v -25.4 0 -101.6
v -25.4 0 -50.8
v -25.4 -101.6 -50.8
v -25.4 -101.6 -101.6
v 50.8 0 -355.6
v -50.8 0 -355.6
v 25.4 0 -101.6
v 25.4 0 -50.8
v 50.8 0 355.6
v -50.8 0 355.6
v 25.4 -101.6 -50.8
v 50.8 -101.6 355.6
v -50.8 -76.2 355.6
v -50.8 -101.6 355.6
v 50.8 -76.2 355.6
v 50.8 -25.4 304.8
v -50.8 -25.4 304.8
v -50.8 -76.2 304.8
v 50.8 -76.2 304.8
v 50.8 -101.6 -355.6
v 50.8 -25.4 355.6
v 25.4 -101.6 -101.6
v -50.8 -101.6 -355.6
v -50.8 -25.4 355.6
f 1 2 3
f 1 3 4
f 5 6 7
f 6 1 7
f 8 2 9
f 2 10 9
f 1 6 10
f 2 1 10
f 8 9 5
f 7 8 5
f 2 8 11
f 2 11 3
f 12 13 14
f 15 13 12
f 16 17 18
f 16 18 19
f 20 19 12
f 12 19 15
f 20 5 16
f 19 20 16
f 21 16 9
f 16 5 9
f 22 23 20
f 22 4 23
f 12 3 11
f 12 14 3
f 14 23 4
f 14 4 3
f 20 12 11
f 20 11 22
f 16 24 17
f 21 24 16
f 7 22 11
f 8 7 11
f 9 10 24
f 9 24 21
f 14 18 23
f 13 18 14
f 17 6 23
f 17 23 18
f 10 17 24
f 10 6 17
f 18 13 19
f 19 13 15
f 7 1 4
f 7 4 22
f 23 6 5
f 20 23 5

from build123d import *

# Parameters (mm, degrees)
F0_W     = 101.6
F0_H     = 711.2
F1_DEPTH = 101.6
F2_W     = 101.6
F2_H     = 50.8
F3_DEPTH = 50.8
F5_DEPTH = 101.6


with BuildPart() as f1:
    # F0 (on Front) → F1 (new body)
    with BuildSketch(Plane.XZ):
        Rectangle(F0_W, F0_H)
    extrude(amount=F1_DEPTH)

    # F2 (on face) → F3 (cut)
    with BuildSketch(Plane.XY.offset(355.6)):
        with Locations((0, -50.8)):
            Rectangle(F2_W, F2_H)
    extrude(amount=-F3_DEPTH, mode=Mode.SUBTRACT)

    # F4 (on face) → F5 (cut)
    with BuildSketch(Plane.XZ.offset(101.6)):
        Polygon((0, -101.6), (25.4, -101.6), (25.4, -50.8), (-25.4, -50.8), (-25.4, -101.6), align=None)
    extrude(amount=-F5_DEPTH, mode=Mode.SUBTRACT)


solid = f1.part
